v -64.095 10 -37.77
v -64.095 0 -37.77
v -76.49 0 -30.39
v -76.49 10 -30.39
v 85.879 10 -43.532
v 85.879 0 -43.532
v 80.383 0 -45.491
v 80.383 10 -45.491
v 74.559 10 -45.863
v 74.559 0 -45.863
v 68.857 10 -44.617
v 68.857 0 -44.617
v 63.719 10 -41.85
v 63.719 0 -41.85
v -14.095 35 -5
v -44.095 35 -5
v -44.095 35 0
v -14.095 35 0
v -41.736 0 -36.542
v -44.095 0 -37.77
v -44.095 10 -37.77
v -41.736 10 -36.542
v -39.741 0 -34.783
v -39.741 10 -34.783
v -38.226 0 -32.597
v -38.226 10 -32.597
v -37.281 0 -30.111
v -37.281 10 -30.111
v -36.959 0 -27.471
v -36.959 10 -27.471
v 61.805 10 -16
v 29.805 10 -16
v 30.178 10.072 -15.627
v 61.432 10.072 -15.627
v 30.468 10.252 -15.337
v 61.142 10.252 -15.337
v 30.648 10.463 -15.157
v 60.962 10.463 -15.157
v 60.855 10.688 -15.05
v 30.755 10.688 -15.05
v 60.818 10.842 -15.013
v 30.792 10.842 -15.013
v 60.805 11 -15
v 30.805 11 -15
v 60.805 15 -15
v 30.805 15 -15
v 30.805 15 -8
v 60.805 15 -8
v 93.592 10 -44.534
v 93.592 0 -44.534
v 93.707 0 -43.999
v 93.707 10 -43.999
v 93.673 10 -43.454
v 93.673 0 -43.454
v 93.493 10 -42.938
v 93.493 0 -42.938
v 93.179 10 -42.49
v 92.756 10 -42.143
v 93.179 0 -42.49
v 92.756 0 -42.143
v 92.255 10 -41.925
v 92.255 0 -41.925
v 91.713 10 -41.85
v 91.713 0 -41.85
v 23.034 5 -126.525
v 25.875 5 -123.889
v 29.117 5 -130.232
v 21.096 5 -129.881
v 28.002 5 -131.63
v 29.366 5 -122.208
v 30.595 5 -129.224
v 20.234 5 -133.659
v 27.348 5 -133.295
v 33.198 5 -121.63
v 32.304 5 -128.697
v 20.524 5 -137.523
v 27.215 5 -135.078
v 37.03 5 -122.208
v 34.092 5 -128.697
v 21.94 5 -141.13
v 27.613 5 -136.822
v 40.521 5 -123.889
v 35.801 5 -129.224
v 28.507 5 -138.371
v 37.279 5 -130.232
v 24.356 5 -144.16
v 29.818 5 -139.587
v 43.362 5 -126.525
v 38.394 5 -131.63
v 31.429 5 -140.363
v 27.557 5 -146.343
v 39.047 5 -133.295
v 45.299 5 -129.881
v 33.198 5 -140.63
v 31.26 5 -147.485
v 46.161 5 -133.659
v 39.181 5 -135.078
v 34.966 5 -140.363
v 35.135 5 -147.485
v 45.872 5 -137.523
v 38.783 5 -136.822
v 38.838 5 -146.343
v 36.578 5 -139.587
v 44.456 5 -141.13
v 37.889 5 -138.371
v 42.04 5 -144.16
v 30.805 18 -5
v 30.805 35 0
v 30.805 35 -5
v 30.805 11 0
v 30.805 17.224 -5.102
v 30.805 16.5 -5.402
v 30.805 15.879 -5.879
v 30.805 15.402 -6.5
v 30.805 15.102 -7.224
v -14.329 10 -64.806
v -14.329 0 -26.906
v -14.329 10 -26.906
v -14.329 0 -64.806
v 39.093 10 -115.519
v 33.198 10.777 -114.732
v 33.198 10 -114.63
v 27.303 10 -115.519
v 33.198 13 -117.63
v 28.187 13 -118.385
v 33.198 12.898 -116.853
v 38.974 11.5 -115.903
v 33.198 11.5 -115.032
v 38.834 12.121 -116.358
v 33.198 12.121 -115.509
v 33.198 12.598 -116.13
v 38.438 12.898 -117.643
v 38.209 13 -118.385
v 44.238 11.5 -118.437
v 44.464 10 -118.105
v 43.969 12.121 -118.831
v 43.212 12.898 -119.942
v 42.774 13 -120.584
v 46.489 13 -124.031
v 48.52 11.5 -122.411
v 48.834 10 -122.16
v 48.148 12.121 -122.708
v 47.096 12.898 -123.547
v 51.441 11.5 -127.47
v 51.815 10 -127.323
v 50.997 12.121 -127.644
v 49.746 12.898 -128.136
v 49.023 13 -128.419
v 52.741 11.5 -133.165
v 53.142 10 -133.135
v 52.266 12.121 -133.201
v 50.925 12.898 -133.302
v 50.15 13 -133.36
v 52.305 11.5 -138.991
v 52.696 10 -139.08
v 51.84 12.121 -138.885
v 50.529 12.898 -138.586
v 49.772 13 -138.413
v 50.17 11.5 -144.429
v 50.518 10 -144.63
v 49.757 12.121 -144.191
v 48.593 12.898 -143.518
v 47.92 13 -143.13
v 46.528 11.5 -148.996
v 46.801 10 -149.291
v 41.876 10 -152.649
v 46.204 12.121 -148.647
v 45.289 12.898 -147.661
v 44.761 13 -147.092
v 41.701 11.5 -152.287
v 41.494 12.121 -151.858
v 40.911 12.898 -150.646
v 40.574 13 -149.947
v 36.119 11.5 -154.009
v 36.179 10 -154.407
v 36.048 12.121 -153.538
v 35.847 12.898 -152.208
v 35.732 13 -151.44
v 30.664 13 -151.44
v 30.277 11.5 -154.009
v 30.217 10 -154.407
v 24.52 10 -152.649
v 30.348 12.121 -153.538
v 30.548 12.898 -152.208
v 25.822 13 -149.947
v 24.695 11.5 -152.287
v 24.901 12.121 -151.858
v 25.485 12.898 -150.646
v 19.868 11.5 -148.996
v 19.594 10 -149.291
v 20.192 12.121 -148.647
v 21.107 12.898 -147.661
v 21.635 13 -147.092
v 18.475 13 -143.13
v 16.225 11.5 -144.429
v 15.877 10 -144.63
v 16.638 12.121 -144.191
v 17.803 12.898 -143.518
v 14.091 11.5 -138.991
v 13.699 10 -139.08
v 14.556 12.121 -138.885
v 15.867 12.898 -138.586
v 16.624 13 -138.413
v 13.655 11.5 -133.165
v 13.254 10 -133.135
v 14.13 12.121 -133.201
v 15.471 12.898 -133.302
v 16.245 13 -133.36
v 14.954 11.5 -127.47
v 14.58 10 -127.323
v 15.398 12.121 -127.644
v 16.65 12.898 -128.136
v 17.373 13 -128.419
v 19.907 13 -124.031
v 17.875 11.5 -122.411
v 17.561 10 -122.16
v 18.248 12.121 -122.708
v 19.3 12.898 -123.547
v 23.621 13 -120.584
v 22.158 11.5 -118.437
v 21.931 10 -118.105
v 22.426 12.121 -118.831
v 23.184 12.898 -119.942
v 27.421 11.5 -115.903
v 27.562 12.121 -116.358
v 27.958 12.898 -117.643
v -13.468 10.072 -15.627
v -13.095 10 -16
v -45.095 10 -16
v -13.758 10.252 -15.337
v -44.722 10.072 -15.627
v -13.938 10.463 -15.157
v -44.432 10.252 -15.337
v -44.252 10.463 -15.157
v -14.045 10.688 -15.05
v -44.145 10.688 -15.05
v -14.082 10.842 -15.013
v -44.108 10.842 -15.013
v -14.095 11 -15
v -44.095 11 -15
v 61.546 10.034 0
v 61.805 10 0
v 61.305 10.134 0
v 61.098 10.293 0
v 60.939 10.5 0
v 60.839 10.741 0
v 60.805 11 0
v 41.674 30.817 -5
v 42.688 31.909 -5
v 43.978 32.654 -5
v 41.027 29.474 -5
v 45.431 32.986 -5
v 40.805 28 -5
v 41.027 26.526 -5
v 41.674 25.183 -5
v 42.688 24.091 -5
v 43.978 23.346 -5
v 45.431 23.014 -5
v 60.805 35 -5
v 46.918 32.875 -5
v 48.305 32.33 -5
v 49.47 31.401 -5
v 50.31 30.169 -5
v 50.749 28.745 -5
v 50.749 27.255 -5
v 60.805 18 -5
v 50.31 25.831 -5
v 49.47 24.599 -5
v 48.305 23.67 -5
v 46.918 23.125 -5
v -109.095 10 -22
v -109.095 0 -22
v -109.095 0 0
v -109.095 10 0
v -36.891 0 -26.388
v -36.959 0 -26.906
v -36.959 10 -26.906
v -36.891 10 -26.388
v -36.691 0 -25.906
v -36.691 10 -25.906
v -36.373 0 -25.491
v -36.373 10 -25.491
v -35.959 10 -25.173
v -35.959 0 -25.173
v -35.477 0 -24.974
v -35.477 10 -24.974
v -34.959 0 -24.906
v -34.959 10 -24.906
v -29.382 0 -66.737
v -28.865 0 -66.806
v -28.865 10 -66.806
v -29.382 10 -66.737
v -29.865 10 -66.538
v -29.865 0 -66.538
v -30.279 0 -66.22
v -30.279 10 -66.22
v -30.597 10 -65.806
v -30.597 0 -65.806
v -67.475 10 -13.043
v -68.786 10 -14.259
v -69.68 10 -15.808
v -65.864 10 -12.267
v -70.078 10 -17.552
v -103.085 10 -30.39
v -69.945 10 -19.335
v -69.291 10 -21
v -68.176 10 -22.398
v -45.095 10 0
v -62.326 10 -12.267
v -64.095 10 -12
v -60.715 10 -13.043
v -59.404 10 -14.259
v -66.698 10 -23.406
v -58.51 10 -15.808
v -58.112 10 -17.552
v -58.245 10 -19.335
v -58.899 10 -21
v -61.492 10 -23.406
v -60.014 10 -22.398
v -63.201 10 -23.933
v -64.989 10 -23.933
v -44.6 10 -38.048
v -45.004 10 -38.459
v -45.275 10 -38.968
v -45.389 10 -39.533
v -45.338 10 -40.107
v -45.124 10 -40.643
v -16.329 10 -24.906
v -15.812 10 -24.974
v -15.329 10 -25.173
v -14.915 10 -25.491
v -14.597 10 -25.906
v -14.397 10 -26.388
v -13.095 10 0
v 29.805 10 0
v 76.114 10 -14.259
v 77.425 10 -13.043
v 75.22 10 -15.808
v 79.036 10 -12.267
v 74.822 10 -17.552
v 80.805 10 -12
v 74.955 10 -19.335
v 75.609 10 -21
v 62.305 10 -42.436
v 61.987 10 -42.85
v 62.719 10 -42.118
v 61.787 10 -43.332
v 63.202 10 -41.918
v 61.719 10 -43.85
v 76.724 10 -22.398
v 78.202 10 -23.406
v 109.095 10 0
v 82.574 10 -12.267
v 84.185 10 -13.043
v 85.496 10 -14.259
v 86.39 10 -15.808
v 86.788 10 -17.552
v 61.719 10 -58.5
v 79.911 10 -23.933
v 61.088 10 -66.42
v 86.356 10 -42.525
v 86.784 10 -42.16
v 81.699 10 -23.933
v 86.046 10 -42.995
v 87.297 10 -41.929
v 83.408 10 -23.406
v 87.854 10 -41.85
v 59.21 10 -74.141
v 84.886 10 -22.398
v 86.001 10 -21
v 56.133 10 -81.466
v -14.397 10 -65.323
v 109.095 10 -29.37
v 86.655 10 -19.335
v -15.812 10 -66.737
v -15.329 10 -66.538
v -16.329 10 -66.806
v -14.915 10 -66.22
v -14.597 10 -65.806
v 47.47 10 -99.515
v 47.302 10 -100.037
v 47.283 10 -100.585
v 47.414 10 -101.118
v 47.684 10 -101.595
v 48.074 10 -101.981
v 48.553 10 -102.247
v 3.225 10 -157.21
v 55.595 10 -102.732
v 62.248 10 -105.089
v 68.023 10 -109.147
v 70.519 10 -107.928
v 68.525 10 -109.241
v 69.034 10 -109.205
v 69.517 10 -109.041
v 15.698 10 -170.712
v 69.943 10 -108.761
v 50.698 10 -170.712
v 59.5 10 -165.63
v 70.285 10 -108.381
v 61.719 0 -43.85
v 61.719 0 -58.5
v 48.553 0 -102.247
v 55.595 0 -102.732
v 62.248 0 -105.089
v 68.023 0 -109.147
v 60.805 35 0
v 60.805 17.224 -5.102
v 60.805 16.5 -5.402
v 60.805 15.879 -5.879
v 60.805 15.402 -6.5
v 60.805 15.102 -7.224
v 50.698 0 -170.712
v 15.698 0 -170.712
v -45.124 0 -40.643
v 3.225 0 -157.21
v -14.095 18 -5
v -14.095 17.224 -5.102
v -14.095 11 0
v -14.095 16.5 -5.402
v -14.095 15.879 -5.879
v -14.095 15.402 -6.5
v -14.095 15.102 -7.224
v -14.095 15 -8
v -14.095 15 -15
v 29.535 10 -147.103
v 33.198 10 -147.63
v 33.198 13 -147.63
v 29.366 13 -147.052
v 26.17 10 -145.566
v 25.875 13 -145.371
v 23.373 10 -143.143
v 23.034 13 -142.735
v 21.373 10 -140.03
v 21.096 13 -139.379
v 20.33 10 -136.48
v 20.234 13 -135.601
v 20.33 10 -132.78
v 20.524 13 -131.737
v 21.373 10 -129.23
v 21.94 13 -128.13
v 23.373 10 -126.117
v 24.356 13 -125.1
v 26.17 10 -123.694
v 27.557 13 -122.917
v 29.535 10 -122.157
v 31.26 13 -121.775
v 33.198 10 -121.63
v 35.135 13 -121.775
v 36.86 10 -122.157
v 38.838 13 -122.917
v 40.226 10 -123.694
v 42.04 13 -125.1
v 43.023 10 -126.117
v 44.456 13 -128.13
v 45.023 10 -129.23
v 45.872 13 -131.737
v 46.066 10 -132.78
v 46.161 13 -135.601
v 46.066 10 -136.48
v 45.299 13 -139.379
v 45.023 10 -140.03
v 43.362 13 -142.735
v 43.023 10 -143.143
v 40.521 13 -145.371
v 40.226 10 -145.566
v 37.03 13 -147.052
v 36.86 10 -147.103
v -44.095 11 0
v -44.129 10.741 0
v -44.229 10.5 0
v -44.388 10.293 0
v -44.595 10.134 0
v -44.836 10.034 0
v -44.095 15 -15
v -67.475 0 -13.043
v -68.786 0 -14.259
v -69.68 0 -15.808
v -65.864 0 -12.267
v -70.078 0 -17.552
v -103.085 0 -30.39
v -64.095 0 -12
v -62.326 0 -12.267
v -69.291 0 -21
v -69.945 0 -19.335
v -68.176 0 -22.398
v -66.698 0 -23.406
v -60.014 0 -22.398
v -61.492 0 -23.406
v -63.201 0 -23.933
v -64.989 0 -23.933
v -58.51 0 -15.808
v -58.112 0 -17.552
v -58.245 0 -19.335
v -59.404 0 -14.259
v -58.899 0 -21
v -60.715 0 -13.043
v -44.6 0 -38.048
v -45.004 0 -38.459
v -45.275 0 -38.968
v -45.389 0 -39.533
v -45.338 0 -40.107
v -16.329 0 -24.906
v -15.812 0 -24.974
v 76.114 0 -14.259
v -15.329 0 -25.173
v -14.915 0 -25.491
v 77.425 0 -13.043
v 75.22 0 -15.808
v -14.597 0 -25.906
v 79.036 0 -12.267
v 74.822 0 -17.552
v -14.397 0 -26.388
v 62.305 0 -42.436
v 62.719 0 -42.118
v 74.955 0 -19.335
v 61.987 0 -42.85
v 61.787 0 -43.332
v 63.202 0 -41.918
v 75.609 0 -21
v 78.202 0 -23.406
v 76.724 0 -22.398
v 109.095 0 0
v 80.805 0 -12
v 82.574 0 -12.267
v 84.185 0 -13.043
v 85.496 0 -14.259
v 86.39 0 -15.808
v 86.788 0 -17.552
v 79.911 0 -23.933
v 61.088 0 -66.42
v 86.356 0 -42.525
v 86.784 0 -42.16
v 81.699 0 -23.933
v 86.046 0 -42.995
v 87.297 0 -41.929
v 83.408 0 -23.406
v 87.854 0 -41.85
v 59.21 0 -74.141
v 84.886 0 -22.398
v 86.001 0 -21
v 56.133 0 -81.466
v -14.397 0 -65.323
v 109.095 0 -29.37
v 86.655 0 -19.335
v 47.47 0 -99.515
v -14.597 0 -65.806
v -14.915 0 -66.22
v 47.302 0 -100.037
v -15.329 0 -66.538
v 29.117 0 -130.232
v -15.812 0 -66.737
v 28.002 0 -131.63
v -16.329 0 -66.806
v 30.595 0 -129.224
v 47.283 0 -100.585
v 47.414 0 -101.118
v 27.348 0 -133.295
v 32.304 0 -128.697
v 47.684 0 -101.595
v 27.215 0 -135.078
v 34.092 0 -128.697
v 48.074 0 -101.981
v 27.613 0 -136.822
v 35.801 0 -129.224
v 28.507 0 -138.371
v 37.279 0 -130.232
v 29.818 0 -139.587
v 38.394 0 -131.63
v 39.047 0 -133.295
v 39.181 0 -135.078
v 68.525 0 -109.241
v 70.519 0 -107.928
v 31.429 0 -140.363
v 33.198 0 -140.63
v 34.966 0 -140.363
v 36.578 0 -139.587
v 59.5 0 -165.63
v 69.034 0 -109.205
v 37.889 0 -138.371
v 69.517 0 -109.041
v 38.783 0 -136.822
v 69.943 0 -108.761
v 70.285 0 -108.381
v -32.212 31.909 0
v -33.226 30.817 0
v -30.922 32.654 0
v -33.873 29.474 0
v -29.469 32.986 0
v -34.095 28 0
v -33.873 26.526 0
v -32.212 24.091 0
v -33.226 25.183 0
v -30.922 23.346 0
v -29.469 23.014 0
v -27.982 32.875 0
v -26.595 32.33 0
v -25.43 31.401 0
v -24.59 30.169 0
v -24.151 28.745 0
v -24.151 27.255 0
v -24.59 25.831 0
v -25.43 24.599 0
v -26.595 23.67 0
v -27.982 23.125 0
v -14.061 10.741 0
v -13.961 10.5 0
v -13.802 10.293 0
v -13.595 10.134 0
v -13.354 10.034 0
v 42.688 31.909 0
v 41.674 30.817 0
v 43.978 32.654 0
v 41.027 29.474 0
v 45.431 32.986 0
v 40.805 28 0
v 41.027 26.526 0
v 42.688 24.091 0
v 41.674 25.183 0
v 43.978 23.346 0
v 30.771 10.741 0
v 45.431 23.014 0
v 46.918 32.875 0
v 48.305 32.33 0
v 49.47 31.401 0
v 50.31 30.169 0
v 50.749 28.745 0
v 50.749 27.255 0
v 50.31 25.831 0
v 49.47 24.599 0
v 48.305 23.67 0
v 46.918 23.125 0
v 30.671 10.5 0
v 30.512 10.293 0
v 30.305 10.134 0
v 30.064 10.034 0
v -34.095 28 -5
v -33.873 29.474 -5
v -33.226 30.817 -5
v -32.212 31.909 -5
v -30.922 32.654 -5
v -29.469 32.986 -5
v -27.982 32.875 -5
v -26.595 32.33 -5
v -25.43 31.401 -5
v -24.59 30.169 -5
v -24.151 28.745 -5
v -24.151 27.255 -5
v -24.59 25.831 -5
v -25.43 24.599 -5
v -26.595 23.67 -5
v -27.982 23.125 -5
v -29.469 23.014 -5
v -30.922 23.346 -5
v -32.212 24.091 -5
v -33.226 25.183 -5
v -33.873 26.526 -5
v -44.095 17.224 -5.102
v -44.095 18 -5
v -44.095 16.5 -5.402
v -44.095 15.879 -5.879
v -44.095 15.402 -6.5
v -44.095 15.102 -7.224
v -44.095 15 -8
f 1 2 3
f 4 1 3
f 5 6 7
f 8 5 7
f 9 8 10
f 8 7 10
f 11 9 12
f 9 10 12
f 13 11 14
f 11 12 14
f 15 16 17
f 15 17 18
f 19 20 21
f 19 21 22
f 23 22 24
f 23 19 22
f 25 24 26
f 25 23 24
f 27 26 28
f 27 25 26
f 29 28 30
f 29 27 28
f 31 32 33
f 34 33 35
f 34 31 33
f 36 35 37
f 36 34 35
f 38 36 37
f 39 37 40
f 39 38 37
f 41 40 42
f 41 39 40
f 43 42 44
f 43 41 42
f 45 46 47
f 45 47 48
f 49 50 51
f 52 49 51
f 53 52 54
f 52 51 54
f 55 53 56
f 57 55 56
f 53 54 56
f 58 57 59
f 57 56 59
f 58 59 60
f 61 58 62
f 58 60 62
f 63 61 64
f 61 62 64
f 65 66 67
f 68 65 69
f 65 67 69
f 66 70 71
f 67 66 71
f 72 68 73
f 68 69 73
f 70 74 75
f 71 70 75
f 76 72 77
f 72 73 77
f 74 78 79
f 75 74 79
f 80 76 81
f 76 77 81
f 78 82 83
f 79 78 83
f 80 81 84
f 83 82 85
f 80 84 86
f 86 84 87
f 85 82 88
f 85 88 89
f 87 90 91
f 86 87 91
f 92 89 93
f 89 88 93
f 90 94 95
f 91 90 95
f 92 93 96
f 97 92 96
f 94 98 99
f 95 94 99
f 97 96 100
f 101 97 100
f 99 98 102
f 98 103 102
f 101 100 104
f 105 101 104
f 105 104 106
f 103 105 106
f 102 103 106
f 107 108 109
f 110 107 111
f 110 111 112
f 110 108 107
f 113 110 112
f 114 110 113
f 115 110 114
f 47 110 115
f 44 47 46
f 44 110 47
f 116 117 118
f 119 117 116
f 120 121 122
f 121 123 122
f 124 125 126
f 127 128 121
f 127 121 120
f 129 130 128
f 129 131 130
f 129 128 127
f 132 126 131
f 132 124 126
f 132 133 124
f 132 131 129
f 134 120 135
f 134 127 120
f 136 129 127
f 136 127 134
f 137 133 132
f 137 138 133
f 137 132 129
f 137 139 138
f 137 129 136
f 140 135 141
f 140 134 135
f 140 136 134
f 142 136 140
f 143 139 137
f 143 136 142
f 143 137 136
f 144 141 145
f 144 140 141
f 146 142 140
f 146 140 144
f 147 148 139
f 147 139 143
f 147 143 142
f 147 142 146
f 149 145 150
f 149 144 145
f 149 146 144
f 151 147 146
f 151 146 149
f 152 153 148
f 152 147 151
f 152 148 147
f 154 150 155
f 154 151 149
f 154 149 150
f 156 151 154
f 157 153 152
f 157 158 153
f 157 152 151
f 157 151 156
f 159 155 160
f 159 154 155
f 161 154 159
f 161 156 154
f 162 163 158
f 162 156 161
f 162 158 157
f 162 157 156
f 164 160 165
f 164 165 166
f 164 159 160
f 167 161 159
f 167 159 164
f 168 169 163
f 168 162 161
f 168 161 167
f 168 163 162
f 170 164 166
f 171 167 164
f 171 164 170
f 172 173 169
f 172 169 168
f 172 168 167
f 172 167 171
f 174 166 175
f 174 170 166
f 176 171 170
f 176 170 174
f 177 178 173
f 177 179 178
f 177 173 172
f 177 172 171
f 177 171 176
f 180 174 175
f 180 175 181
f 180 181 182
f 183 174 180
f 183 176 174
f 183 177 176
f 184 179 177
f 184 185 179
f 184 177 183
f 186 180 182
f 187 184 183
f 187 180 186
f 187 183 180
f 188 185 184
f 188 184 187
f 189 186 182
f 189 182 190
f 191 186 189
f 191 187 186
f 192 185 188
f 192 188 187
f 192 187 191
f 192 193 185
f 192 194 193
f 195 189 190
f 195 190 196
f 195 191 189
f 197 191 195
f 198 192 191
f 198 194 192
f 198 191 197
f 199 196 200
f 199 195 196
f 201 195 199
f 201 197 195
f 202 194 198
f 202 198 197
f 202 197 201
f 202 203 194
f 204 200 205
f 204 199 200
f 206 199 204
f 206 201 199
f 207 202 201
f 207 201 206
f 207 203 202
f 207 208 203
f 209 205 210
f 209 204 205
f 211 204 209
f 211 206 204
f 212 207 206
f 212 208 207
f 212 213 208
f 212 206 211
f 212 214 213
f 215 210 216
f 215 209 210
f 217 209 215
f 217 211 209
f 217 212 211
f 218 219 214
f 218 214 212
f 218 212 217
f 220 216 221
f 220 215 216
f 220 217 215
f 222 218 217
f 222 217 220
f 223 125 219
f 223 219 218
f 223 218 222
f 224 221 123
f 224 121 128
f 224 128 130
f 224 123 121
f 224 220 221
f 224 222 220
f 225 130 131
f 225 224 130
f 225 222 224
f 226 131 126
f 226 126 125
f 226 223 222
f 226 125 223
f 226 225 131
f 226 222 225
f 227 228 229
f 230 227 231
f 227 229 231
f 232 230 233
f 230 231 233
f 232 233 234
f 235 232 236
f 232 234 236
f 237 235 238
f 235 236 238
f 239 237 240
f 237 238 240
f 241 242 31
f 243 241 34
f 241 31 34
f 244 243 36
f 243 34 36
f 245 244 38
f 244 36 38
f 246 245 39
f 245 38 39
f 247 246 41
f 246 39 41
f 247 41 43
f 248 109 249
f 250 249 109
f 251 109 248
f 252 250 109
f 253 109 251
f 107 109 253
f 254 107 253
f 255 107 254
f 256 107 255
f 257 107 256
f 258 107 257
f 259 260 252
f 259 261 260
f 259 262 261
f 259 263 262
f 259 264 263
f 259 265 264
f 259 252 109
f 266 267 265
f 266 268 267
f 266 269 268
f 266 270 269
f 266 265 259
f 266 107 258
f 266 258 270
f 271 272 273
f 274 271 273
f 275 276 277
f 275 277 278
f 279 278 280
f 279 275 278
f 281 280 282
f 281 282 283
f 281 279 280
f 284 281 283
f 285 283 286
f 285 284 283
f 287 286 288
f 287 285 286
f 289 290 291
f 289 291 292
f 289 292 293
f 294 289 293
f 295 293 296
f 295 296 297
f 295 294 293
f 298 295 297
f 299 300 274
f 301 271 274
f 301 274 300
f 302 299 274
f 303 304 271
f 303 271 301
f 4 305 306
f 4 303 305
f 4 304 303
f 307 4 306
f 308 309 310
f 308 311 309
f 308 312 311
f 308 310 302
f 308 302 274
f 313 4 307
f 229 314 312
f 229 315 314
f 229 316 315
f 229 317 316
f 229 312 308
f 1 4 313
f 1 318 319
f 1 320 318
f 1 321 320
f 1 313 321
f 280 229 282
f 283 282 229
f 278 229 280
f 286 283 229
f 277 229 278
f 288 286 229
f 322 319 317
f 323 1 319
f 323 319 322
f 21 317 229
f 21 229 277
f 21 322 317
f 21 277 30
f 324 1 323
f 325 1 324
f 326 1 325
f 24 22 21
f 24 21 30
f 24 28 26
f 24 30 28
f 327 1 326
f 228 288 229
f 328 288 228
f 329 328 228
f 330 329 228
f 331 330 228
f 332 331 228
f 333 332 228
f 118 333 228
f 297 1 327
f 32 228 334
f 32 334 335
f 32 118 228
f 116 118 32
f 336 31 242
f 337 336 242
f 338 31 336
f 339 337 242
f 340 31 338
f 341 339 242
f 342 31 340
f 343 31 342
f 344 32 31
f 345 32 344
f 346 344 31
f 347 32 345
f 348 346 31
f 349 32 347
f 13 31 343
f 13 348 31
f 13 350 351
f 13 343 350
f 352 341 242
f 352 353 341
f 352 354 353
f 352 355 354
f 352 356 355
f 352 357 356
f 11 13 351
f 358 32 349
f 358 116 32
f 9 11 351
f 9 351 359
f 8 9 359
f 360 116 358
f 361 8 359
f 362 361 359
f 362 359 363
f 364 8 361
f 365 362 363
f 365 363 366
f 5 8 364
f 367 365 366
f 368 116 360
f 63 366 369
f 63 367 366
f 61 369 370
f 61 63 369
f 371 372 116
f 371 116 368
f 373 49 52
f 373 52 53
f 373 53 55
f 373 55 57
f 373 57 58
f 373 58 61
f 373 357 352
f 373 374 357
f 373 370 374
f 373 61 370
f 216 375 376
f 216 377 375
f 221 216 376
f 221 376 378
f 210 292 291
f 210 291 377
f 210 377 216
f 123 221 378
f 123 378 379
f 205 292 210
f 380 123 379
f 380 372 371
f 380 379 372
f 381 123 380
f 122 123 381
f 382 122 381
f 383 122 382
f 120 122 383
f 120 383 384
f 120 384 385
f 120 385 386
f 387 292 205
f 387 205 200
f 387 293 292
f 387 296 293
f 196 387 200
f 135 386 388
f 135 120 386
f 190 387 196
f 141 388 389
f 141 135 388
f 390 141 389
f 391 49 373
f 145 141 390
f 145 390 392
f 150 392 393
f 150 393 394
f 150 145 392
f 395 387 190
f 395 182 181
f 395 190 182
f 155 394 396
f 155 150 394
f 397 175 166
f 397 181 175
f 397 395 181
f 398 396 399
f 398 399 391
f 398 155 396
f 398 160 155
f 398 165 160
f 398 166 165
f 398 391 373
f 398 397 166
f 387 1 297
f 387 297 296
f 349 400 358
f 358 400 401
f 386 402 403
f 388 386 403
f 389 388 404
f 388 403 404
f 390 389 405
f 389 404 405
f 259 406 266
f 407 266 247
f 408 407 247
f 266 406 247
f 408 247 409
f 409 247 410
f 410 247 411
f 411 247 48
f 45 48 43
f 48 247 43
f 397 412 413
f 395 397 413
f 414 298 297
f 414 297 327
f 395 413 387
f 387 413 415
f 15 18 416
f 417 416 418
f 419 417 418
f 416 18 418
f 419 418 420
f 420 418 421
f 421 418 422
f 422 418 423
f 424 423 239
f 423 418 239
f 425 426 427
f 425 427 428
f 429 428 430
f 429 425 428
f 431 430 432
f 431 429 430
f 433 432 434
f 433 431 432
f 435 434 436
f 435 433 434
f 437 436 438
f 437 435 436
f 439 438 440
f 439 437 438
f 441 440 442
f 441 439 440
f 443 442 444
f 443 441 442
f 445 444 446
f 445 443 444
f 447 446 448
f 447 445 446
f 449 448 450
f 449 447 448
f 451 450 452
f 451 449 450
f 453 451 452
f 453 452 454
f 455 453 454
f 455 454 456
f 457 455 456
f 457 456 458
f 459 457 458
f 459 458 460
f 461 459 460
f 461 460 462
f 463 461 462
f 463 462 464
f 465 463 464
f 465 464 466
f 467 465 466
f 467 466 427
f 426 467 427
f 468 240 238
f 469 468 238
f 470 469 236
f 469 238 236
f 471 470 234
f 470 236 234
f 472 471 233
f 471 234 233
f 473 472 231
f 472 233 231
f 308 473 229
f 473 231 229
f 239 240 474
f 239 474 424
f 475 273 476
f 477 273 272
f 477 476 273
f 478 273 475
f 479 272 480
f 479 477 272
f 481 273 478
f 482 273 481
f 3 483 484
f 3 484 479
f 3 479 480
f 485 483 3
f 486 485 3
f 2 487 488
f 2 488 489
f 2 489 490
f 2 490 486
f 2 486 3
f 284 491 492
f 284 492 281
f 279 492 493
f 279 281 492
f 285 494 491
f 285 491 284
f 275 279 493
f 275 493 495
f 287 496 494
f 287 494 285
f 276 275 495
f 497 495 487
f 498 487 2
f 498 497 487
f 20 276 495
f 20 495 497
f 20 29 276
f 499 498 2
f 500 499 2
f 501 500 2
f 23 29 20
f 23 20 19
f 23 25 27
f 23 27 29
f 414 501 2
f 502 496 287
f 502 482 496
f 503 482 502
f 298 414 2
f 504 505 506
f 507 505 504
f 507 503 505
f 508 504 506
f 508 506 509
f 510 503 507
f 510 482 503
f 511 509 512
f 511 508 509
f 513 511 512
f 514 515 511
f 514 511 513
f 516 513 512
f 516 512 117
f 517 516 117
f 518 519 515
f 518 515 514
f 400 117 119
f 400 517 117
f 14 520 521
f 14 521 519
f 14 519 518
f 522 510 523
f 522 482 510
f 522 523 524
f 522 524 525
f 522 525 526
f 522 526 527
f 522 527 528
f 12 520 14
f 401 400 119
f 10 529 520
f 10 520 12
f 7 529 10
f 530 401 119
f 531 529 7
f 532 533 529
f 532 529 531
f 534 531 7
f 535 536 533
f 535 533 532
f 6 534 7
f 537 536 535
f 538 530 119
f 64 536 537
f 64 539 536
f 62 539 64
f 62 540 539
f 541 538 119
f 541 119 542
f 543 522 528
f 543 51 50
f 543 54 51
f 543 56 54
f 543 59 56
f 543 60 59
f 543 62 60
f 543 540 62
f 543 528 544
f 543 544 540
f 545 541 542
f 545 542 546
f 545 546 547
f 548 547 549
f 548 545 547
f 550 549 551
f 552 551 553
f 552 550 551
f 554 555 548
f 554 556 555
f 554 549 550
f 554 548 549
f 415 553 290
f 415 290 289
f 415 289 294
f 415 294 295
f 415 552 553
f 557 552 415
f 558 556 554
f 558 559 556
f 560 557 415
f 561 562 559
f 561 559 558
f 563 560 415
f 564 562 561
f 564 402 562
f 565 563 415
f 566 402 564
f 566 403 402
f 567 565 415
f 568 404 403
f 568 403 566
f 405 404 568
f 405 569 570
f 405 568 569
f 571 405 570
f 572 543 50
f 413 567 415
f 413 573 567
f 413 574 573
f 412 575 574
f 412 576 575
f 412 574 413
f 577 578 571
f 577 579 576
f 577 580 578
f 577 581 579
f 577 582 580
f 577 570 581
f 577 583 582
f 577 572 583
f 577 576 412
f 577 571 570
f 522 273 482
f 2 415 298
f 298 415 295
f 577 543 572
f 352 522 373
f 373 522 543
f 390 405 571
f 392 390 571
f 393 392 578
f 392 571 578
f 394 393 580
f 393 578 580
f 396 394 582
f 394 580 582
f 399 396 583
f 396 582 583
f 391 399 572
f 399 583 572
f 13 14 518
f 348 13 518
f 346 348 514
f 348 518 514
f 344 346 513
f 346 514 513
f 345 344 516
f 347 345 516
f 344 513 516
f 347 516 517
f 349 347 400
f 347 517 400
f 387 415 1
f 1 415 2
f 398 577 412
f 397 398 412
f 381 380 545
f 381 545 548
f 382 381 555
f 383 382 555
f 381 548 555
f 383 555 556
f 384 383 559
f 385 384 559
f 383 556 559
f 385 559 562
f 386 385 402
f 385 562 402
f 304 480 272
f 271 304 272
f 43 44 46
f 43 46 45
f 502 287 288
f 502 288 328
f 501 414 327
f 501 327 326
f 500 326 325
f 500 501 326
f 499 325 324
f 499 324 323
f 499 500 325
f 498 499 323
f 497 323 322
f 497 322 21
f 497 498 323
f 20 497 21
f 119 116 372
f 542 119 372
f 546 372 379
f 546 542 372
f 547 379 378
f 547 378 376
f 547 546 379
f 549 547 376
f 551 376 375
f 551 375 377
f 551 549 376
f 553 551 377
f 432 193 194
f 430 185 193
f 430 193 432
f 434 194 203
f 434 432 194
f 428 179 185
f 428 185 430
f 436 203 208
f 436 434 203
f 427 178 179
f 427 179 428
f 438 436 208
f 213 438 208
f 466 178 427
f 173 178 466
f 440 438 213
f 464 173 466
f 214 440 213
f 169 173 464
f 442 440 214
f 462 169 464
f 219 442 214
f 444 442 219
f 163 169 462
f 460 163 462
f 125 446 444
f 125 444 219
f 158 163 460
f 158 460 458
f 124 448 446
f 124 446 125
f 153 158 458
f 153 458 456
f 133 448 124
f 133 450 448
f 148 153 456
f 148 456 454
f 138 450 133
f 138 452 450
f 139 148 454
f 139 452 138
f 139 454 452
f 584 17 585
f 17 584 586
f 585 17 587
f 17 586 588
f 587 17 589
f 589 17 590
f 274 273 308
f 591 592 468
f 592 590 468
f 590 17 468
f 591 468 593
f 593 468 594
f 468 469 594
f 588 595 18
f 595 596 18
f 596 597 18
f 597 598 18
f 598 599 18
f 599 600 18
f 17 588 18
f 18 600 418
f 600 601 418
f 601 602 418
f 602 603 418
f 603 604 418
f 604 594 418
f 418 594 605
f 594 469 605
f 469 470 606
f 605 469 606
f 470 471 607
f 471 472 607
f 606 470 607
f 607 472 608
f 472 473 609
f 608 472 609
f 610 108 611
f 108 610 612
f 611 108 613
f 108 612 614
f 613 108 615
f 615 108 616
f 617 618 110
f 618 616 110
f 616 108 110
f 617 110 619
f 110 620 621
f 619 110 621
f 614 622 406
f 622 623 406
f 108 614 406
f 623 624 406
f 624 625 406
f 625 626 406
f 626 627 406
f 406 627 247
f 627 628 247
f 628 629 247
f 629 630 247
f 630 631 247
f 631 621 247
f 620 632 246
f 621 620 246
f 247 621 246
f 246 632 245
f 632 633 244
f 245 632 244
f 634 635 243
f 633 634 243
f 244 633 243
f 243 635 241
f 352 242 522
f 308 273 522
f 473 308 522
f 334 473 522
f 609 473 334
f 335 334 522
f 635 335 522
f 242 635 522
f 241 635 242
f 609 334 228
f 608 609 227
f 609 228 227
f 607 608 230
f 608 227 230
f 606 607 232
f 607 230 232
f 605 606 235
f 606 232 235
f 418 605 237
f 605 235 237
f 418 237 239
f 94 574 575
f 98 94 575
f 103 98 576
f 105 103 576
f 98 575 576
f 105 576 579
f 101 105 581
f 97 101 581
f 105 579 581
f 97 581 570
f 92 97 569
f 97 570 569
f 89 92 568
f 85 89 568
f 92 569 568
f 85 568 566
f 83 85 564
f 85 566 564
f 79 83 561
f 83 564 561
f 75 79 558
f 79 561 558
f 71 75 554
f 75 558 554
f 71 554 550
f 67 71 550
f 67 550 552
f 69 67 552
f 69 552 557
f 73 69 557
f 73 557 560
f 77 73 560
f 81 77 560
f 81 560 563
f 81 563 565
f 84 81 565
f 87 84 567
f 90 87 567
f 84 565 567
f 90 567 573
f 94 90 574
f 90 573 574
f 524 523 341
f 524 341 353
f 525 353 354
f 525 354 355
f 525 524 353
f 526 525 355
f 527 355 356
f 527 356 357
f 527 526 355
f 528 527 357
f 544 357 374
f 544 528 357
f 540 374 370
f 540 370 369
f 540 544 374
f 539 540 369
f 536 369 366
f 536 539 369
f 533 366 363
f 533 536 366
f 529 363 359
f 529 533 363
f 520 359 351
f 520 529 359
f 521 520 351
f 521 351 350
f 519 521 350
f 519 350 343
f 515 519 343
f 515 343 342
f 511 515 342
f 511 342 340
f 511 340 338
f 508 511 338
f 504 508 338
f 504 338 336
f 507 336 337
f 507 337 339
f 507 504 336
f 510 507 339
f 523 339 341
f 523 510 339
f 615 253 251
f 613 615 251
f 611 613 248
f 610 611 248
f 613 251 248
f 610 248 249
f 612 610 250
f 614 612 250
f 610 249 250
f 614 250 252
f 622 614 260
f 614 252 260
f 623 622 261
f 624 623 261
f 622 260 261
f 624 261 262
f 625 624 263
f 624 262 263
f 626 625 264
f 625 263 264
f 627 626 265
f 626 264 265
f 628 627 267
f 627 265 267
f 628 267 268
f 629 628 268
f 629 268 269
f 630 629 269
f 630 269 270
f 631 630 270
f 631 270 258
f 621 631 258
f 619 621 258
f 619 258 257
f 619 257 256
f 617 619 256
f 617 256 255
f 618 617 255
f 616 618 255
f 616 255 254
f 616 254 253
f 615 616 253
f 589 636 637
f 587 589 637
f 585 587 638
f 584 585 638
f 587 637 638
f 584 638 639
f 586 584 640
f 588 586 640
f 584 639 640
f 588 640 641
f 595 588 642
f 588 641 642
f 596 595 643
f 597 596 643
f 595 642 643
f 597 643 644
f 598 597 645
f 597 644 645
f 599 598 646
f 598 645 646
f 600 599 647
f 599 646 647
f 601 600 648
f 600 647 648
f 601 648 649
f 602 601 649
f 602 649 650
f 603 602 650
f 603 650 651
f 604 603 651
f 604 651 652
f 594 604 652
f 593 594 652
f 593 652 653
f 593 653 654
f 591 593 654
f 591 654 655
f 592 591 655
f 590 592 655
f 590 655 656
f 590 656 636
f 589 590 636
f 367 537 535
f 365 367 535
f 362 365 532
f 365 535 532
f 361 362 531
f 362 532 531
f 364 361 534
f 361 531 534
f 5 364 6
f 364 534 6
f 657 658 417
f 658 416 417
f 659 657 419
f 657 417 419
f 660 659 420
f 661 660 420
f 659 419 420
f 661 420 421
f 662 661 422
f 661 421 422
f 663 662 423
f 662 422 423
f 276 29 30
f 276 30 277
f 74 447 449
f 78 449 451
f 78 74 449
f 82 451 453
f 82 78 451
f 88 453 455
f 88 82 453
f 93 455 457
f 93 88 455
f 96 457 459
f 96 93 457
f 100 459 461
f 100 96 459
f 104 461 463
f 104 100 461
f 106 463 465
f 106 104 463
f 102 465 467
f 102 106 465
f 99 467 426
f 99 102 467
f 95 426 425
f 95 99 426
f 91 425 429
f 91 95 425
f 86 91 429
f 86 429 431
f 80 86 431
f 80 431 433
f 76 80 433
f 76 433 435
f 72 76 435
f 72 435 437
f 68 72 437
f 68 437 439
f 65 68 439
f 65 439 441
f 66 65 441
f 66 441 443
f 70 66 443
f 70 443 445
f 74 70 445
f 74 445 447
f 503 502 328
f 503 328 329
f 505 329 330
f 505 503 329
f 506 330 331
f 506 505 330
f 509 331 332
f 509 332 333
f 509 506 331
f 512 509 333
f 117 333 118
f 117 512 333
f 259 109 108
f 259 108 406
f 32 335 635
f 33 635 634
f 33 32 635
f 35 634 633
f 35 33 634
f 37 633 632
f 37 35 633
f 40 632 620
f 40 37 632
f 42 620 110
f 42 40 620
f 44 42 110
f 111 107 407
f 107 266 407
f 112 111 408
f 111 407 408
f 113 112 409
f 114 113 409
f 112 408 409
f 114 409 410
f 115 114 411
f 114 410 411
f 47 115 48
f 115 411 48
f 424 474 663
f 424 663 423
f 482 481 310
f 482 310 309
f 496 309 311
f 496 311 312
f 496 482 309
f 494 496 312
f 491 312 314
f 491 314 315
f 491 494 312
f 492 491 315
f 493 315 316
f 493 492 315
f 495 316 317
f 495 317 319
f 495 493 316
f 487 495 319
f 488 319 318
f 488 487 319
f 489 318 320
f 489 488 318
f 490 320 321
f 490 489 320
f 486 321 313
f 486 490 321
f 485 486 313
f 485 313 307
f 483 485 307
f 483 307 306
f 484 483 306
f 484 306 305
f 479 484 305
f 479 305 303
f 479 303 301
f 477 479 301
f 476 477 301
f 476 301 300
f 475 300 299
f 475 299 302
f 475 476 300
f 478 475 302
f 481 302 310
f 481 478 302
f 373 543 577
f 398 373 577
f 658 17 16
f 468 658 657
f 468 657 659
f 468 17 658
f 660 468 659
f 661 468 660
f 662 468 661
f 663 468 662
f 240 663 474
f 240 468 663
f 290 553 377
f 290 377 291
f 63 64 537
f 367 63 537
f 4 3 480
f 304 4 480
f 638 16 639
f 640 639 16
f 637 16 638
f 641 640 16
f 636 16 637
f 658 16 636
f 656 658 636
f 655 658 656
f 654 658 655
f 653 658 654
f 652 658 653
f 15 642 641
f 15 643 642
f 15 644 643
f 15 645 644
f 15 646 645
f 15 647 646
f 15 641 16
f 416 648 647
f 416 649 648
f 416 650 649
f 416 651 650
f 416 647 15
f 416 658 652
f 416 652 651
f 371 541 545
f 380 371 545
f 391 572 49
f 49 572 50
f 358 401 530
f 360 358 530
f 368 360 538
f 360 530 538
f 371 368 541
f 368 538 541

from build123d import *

# Parameters (mm, degrees)
CROQUIS1_R              = 13
CROQUIS1_R_2            = 6
SALIENTE_EXTRUIR1_DEPTH = 10
CROQUIS2_W              = 30
CROQUIS2_H              = 15
SALIENTE_EXTRUIR2_DEPTH = 5
CROQUIS3_W              = 30
CROQUIS3_H              = 5
SALIENTE_EXTRUIR3_DEPTH = 20
CROQUIS4_R              = 5
CORTAR_EXTRUIR1_DEPTH   = 20
REDONDEO1_R             = 1
REDONDEO2_R             = 1
REDONDEO3_R             = 3
CROQUIS5_R              = 13
CROQUIS5_R_2            = 6
SALIENTE_EXTRUIR4_DEPTH = 5
CROQUIS6_R              = 20
CROQUIS6_R_2            = 13
SALIENTE_EXTRUIR5_DEPTH = 3
REDONDEO4_R             = 3


with BuildPart() as part:
    # Croquis1 → Saliente-Extruir1 (new body)
    with BuildSketch(Plane(origin=(0, 0, 0), x_dir=(1, 0, 0), z_dir=(0, 1, 0))):
        Polygon((-109.095, 0), (109.095, 0), (109.095, 29.37), (59.500415879, 165.63), (50.697846821, 170.712165615), (15.697846821, 170.712165615), (3.225, 157.21), (-64.095, 37.77), (-76.489816261, 30.39), (-103.085, 30.39), (-109.095, 22), align=None)
        with Locations(Location((33.197846821, 134.63, 0), (0, 0, 270))):
            Circle(CROQUIS1_R, mode=Mode.SUBTRACT)
        with Locations(Location((-64.095, 18, 0), (0, 0, 270))):
            Circle(CROQUIS1_R_2, mode=Mode.SUBTRACT)
        with Locations(Location((80.805, 18, 0), (0, 0, 270))):
            Circle(CROQUIS1_R_2, mode=Mode.SUBTRACT)
        with BuildLine():
            Line((-34.959241143, 24.905539046), (-16.329241143, 24.905539046))
            ThreePointArc((-16.329241143, 24.905539046), (-14.915027581, 25.491325484), (-14.329241143, 26.905539046))
            Line((-14.329241143, 26.905539046), (-14.329241143, 64.805539046))
            ThreePointArc((-14.329241143, 64.805539046), (-14.915027581, 66.219752609), (-16.329241143, 66.805539046))
            Line((-16.329241143, 66.805539046), (-28.864540605, 66.805539046))
            ThreePointArc((-28.864540605, 66.805539046), (-29.864540605, 66.537589854), (-30.596591412, 65.805539046))
            Line((-30.596591412, 65.805539046), (-45.124461509, 40.642529914))
            ThreePointArc((-45.124461509, 40.642529914), (-45.275154746, 38.967789325), (-44.095, 37.77))
            ThreePointArc((-44.095, 37.77), (-38.917486541, 33.735802046), (-36.959241143, 27.471085475))
            Line((-36.959241143, 27.471085475), (-36.959241143, 26.905539046))
            ThreePointArc((-36.959241143, 26.905539046), (-36.373454706, 25.491325484), (-34.959241143, 24.905539046))
        make_face(mode=Mode.SUBTRACT)
        with BuildLine():
            Line((70.518843068, 107.928122629), (93.592402069, 44.534040287))
            ThreePointArc((93.592402069, 44.534040287), (93.351320916, 42.702847127), (91.713016828, 41.85))
            Line((91.713016828, 41.85), (87.853935228, 41.85))
            ThreePointArc((87.853935228, 41.85), (86.557059698, 42.32746466), (85.879396403, 43.53188614))
            ThreePointArc((85.879396403, 43.53188614), (74.558636842, 45.862576394), (63.719312841, 41.85))
            ThreePointArc((63.719312841, 41.85), (62.305099279, 42.435786438), (61.719312841, 43.85))
            Line((61.719312841, 43.85), (61.719312841, 58.5))
            ThreePointArc((61.719312841, 58.5), (60.302618614, 70.31788476), (56.132816833, 81.466076355))
            Line((56.132816833, 81.466076355), (47.469675424, 99.515111912))
            ThreePointArc((47.469675424, 99.515111912), (47.413687511, 101.118061517), (48.553338923, 102.246678699))
            ThreePointArc((48.553338923, 102.246678699), (59.00154122, 103.684084154), (68.023190025, 109.146768338))
            ThreePointArc((68.023190025, 109.146768338), (69.517034466, 109.041263258), (70.518843068, 107.928122629))
        make_face(mode=Mode.SUBTRACT)
    extrude(amount=SALIENTE_EXTRUIR1_DEPTH)

    # Croquis2 → Saliente-Extruir2 (add)
    with BuildSketch(Plane(origin=(0, 10, 0), x_dir=(1, 0, 0), z_dir=(0, 1, 0))):
        with Locations((-29.095, 7.5)):
            Rectangle(CROQUIS2_W, CROQUIS2_H)
        with Locations((45.805, 7.5)):
            Rectangle(CROQUIS2_W, CROQUIS2_H)
    extrude(amount=SALIENTE_EXTRUIR2_DEPTH)

    # Croquis3 → Saliente-Extruir3 (add)
    with BuildSketch(Plane(origin=(0, 15, 0), x_dir=(1, 0, 0), z_dir=(0, 1, 0))):
        with Locations((-29.095, 2.5)):
            Rectangle(CROQUIS3_W, CROQUIS3_H)
        with Locations((45.805, 2.5)):
            Rectangle(CROQUIS3_W, CROQUIS3_H)
    extrude(amount=SALIENTE_EXTRUIR3_DEPTH)

    # Croquis4 → Cortar-Extruir1 (cut)
    with BuildSketch(Plane(origin=(0, 0, -5), x_dir=(-1, 0, 0), z_dir=(0, 0, -1))):
        with Locations((-45.805, 28)):
            Circle(CROQUIS4_R)
        with Locations((29.095, 28)):
            Circle(CROQUIS4_R)
    extrude(amount=-CORTAR_EXTRUIR1_DEPTH, mode=Mode.SUBTRACT)

    # Redondeo1
    redondeo1_edges = [part.edges().sort_by_distance(p)[0] for p in [
        (-14.095, 10, -7.5),
        (-44.095, 10, -7.5),
        (60.805, 10, -7.5),
        (30.805, 10, -7.5),
    ]]
    fillet(redondeo1_edges, radius=REDONDEO1_R)

    # Redondeo2
    redondeo2_edges = [part.edges().sort_by_distance(p)[0] for p in [
        (45.805, 10, -15),
        (-29.095, 10, -15),
    ]]
    fillet(redondeo2_edges, radius=REDONDEO2_R)

    # Redondeo3
    redondeo3_edges = [part.edges().sort_by_distance(p)[0] for p in [
        (-29.095, 15, -5),
        (45.805, 15, -5),
    ]]
    fillet(redondeo3_edges, radius=REDONDEO3_R)

    # Croquis5 → Saliente-Extruir4 (add)
    with BuildSketch(Plane.XZ):
        with Locations(Location((33.197846821, -134.63, 0), (0, 0, 270))):
            Circle(CROQUIS5_R)
        with Locations(Location((33.197846821, -134.63, 0), (0, 0, 270))):
            Circle(CROQUIS5_R_2, mode=Mode.SUBTRACT)
    extrude(amount=-SALIENTE_EXTRUIR4_DEPTH)

    # Croquis6 → Saliente-Extruir5 (add)
    with BuildSketch(Plane(origin=(0, 10, 0), x_dir=(1, 0, 0), z_dir=(0, 1, 0))):
        with Locations(Location((33.197846821, 134.63, 0), (0, 0, 270))):
            Circle(CROQUIS6_R)
        with Locations(Location((33.197846821, 134.63, 0), (0, 0, 90))):
            Circle(CROQUIS6_R_2, mode=Mode.SUBTRACT)
    extrude(amount=SALIENTE_EXTRUIR5_DEPTH)

    # Redondeo4
    redondeo4_edges = [part.edges().sort_by_distance(p)[0] for p in [
        (33.197846821, 13, -154.63),
    ]]
    fillet(redondeo4_edges, radius=REDONDEO4_R - 0.0001)  # a hair under: the kernel refuses the full size


solid = part.part
